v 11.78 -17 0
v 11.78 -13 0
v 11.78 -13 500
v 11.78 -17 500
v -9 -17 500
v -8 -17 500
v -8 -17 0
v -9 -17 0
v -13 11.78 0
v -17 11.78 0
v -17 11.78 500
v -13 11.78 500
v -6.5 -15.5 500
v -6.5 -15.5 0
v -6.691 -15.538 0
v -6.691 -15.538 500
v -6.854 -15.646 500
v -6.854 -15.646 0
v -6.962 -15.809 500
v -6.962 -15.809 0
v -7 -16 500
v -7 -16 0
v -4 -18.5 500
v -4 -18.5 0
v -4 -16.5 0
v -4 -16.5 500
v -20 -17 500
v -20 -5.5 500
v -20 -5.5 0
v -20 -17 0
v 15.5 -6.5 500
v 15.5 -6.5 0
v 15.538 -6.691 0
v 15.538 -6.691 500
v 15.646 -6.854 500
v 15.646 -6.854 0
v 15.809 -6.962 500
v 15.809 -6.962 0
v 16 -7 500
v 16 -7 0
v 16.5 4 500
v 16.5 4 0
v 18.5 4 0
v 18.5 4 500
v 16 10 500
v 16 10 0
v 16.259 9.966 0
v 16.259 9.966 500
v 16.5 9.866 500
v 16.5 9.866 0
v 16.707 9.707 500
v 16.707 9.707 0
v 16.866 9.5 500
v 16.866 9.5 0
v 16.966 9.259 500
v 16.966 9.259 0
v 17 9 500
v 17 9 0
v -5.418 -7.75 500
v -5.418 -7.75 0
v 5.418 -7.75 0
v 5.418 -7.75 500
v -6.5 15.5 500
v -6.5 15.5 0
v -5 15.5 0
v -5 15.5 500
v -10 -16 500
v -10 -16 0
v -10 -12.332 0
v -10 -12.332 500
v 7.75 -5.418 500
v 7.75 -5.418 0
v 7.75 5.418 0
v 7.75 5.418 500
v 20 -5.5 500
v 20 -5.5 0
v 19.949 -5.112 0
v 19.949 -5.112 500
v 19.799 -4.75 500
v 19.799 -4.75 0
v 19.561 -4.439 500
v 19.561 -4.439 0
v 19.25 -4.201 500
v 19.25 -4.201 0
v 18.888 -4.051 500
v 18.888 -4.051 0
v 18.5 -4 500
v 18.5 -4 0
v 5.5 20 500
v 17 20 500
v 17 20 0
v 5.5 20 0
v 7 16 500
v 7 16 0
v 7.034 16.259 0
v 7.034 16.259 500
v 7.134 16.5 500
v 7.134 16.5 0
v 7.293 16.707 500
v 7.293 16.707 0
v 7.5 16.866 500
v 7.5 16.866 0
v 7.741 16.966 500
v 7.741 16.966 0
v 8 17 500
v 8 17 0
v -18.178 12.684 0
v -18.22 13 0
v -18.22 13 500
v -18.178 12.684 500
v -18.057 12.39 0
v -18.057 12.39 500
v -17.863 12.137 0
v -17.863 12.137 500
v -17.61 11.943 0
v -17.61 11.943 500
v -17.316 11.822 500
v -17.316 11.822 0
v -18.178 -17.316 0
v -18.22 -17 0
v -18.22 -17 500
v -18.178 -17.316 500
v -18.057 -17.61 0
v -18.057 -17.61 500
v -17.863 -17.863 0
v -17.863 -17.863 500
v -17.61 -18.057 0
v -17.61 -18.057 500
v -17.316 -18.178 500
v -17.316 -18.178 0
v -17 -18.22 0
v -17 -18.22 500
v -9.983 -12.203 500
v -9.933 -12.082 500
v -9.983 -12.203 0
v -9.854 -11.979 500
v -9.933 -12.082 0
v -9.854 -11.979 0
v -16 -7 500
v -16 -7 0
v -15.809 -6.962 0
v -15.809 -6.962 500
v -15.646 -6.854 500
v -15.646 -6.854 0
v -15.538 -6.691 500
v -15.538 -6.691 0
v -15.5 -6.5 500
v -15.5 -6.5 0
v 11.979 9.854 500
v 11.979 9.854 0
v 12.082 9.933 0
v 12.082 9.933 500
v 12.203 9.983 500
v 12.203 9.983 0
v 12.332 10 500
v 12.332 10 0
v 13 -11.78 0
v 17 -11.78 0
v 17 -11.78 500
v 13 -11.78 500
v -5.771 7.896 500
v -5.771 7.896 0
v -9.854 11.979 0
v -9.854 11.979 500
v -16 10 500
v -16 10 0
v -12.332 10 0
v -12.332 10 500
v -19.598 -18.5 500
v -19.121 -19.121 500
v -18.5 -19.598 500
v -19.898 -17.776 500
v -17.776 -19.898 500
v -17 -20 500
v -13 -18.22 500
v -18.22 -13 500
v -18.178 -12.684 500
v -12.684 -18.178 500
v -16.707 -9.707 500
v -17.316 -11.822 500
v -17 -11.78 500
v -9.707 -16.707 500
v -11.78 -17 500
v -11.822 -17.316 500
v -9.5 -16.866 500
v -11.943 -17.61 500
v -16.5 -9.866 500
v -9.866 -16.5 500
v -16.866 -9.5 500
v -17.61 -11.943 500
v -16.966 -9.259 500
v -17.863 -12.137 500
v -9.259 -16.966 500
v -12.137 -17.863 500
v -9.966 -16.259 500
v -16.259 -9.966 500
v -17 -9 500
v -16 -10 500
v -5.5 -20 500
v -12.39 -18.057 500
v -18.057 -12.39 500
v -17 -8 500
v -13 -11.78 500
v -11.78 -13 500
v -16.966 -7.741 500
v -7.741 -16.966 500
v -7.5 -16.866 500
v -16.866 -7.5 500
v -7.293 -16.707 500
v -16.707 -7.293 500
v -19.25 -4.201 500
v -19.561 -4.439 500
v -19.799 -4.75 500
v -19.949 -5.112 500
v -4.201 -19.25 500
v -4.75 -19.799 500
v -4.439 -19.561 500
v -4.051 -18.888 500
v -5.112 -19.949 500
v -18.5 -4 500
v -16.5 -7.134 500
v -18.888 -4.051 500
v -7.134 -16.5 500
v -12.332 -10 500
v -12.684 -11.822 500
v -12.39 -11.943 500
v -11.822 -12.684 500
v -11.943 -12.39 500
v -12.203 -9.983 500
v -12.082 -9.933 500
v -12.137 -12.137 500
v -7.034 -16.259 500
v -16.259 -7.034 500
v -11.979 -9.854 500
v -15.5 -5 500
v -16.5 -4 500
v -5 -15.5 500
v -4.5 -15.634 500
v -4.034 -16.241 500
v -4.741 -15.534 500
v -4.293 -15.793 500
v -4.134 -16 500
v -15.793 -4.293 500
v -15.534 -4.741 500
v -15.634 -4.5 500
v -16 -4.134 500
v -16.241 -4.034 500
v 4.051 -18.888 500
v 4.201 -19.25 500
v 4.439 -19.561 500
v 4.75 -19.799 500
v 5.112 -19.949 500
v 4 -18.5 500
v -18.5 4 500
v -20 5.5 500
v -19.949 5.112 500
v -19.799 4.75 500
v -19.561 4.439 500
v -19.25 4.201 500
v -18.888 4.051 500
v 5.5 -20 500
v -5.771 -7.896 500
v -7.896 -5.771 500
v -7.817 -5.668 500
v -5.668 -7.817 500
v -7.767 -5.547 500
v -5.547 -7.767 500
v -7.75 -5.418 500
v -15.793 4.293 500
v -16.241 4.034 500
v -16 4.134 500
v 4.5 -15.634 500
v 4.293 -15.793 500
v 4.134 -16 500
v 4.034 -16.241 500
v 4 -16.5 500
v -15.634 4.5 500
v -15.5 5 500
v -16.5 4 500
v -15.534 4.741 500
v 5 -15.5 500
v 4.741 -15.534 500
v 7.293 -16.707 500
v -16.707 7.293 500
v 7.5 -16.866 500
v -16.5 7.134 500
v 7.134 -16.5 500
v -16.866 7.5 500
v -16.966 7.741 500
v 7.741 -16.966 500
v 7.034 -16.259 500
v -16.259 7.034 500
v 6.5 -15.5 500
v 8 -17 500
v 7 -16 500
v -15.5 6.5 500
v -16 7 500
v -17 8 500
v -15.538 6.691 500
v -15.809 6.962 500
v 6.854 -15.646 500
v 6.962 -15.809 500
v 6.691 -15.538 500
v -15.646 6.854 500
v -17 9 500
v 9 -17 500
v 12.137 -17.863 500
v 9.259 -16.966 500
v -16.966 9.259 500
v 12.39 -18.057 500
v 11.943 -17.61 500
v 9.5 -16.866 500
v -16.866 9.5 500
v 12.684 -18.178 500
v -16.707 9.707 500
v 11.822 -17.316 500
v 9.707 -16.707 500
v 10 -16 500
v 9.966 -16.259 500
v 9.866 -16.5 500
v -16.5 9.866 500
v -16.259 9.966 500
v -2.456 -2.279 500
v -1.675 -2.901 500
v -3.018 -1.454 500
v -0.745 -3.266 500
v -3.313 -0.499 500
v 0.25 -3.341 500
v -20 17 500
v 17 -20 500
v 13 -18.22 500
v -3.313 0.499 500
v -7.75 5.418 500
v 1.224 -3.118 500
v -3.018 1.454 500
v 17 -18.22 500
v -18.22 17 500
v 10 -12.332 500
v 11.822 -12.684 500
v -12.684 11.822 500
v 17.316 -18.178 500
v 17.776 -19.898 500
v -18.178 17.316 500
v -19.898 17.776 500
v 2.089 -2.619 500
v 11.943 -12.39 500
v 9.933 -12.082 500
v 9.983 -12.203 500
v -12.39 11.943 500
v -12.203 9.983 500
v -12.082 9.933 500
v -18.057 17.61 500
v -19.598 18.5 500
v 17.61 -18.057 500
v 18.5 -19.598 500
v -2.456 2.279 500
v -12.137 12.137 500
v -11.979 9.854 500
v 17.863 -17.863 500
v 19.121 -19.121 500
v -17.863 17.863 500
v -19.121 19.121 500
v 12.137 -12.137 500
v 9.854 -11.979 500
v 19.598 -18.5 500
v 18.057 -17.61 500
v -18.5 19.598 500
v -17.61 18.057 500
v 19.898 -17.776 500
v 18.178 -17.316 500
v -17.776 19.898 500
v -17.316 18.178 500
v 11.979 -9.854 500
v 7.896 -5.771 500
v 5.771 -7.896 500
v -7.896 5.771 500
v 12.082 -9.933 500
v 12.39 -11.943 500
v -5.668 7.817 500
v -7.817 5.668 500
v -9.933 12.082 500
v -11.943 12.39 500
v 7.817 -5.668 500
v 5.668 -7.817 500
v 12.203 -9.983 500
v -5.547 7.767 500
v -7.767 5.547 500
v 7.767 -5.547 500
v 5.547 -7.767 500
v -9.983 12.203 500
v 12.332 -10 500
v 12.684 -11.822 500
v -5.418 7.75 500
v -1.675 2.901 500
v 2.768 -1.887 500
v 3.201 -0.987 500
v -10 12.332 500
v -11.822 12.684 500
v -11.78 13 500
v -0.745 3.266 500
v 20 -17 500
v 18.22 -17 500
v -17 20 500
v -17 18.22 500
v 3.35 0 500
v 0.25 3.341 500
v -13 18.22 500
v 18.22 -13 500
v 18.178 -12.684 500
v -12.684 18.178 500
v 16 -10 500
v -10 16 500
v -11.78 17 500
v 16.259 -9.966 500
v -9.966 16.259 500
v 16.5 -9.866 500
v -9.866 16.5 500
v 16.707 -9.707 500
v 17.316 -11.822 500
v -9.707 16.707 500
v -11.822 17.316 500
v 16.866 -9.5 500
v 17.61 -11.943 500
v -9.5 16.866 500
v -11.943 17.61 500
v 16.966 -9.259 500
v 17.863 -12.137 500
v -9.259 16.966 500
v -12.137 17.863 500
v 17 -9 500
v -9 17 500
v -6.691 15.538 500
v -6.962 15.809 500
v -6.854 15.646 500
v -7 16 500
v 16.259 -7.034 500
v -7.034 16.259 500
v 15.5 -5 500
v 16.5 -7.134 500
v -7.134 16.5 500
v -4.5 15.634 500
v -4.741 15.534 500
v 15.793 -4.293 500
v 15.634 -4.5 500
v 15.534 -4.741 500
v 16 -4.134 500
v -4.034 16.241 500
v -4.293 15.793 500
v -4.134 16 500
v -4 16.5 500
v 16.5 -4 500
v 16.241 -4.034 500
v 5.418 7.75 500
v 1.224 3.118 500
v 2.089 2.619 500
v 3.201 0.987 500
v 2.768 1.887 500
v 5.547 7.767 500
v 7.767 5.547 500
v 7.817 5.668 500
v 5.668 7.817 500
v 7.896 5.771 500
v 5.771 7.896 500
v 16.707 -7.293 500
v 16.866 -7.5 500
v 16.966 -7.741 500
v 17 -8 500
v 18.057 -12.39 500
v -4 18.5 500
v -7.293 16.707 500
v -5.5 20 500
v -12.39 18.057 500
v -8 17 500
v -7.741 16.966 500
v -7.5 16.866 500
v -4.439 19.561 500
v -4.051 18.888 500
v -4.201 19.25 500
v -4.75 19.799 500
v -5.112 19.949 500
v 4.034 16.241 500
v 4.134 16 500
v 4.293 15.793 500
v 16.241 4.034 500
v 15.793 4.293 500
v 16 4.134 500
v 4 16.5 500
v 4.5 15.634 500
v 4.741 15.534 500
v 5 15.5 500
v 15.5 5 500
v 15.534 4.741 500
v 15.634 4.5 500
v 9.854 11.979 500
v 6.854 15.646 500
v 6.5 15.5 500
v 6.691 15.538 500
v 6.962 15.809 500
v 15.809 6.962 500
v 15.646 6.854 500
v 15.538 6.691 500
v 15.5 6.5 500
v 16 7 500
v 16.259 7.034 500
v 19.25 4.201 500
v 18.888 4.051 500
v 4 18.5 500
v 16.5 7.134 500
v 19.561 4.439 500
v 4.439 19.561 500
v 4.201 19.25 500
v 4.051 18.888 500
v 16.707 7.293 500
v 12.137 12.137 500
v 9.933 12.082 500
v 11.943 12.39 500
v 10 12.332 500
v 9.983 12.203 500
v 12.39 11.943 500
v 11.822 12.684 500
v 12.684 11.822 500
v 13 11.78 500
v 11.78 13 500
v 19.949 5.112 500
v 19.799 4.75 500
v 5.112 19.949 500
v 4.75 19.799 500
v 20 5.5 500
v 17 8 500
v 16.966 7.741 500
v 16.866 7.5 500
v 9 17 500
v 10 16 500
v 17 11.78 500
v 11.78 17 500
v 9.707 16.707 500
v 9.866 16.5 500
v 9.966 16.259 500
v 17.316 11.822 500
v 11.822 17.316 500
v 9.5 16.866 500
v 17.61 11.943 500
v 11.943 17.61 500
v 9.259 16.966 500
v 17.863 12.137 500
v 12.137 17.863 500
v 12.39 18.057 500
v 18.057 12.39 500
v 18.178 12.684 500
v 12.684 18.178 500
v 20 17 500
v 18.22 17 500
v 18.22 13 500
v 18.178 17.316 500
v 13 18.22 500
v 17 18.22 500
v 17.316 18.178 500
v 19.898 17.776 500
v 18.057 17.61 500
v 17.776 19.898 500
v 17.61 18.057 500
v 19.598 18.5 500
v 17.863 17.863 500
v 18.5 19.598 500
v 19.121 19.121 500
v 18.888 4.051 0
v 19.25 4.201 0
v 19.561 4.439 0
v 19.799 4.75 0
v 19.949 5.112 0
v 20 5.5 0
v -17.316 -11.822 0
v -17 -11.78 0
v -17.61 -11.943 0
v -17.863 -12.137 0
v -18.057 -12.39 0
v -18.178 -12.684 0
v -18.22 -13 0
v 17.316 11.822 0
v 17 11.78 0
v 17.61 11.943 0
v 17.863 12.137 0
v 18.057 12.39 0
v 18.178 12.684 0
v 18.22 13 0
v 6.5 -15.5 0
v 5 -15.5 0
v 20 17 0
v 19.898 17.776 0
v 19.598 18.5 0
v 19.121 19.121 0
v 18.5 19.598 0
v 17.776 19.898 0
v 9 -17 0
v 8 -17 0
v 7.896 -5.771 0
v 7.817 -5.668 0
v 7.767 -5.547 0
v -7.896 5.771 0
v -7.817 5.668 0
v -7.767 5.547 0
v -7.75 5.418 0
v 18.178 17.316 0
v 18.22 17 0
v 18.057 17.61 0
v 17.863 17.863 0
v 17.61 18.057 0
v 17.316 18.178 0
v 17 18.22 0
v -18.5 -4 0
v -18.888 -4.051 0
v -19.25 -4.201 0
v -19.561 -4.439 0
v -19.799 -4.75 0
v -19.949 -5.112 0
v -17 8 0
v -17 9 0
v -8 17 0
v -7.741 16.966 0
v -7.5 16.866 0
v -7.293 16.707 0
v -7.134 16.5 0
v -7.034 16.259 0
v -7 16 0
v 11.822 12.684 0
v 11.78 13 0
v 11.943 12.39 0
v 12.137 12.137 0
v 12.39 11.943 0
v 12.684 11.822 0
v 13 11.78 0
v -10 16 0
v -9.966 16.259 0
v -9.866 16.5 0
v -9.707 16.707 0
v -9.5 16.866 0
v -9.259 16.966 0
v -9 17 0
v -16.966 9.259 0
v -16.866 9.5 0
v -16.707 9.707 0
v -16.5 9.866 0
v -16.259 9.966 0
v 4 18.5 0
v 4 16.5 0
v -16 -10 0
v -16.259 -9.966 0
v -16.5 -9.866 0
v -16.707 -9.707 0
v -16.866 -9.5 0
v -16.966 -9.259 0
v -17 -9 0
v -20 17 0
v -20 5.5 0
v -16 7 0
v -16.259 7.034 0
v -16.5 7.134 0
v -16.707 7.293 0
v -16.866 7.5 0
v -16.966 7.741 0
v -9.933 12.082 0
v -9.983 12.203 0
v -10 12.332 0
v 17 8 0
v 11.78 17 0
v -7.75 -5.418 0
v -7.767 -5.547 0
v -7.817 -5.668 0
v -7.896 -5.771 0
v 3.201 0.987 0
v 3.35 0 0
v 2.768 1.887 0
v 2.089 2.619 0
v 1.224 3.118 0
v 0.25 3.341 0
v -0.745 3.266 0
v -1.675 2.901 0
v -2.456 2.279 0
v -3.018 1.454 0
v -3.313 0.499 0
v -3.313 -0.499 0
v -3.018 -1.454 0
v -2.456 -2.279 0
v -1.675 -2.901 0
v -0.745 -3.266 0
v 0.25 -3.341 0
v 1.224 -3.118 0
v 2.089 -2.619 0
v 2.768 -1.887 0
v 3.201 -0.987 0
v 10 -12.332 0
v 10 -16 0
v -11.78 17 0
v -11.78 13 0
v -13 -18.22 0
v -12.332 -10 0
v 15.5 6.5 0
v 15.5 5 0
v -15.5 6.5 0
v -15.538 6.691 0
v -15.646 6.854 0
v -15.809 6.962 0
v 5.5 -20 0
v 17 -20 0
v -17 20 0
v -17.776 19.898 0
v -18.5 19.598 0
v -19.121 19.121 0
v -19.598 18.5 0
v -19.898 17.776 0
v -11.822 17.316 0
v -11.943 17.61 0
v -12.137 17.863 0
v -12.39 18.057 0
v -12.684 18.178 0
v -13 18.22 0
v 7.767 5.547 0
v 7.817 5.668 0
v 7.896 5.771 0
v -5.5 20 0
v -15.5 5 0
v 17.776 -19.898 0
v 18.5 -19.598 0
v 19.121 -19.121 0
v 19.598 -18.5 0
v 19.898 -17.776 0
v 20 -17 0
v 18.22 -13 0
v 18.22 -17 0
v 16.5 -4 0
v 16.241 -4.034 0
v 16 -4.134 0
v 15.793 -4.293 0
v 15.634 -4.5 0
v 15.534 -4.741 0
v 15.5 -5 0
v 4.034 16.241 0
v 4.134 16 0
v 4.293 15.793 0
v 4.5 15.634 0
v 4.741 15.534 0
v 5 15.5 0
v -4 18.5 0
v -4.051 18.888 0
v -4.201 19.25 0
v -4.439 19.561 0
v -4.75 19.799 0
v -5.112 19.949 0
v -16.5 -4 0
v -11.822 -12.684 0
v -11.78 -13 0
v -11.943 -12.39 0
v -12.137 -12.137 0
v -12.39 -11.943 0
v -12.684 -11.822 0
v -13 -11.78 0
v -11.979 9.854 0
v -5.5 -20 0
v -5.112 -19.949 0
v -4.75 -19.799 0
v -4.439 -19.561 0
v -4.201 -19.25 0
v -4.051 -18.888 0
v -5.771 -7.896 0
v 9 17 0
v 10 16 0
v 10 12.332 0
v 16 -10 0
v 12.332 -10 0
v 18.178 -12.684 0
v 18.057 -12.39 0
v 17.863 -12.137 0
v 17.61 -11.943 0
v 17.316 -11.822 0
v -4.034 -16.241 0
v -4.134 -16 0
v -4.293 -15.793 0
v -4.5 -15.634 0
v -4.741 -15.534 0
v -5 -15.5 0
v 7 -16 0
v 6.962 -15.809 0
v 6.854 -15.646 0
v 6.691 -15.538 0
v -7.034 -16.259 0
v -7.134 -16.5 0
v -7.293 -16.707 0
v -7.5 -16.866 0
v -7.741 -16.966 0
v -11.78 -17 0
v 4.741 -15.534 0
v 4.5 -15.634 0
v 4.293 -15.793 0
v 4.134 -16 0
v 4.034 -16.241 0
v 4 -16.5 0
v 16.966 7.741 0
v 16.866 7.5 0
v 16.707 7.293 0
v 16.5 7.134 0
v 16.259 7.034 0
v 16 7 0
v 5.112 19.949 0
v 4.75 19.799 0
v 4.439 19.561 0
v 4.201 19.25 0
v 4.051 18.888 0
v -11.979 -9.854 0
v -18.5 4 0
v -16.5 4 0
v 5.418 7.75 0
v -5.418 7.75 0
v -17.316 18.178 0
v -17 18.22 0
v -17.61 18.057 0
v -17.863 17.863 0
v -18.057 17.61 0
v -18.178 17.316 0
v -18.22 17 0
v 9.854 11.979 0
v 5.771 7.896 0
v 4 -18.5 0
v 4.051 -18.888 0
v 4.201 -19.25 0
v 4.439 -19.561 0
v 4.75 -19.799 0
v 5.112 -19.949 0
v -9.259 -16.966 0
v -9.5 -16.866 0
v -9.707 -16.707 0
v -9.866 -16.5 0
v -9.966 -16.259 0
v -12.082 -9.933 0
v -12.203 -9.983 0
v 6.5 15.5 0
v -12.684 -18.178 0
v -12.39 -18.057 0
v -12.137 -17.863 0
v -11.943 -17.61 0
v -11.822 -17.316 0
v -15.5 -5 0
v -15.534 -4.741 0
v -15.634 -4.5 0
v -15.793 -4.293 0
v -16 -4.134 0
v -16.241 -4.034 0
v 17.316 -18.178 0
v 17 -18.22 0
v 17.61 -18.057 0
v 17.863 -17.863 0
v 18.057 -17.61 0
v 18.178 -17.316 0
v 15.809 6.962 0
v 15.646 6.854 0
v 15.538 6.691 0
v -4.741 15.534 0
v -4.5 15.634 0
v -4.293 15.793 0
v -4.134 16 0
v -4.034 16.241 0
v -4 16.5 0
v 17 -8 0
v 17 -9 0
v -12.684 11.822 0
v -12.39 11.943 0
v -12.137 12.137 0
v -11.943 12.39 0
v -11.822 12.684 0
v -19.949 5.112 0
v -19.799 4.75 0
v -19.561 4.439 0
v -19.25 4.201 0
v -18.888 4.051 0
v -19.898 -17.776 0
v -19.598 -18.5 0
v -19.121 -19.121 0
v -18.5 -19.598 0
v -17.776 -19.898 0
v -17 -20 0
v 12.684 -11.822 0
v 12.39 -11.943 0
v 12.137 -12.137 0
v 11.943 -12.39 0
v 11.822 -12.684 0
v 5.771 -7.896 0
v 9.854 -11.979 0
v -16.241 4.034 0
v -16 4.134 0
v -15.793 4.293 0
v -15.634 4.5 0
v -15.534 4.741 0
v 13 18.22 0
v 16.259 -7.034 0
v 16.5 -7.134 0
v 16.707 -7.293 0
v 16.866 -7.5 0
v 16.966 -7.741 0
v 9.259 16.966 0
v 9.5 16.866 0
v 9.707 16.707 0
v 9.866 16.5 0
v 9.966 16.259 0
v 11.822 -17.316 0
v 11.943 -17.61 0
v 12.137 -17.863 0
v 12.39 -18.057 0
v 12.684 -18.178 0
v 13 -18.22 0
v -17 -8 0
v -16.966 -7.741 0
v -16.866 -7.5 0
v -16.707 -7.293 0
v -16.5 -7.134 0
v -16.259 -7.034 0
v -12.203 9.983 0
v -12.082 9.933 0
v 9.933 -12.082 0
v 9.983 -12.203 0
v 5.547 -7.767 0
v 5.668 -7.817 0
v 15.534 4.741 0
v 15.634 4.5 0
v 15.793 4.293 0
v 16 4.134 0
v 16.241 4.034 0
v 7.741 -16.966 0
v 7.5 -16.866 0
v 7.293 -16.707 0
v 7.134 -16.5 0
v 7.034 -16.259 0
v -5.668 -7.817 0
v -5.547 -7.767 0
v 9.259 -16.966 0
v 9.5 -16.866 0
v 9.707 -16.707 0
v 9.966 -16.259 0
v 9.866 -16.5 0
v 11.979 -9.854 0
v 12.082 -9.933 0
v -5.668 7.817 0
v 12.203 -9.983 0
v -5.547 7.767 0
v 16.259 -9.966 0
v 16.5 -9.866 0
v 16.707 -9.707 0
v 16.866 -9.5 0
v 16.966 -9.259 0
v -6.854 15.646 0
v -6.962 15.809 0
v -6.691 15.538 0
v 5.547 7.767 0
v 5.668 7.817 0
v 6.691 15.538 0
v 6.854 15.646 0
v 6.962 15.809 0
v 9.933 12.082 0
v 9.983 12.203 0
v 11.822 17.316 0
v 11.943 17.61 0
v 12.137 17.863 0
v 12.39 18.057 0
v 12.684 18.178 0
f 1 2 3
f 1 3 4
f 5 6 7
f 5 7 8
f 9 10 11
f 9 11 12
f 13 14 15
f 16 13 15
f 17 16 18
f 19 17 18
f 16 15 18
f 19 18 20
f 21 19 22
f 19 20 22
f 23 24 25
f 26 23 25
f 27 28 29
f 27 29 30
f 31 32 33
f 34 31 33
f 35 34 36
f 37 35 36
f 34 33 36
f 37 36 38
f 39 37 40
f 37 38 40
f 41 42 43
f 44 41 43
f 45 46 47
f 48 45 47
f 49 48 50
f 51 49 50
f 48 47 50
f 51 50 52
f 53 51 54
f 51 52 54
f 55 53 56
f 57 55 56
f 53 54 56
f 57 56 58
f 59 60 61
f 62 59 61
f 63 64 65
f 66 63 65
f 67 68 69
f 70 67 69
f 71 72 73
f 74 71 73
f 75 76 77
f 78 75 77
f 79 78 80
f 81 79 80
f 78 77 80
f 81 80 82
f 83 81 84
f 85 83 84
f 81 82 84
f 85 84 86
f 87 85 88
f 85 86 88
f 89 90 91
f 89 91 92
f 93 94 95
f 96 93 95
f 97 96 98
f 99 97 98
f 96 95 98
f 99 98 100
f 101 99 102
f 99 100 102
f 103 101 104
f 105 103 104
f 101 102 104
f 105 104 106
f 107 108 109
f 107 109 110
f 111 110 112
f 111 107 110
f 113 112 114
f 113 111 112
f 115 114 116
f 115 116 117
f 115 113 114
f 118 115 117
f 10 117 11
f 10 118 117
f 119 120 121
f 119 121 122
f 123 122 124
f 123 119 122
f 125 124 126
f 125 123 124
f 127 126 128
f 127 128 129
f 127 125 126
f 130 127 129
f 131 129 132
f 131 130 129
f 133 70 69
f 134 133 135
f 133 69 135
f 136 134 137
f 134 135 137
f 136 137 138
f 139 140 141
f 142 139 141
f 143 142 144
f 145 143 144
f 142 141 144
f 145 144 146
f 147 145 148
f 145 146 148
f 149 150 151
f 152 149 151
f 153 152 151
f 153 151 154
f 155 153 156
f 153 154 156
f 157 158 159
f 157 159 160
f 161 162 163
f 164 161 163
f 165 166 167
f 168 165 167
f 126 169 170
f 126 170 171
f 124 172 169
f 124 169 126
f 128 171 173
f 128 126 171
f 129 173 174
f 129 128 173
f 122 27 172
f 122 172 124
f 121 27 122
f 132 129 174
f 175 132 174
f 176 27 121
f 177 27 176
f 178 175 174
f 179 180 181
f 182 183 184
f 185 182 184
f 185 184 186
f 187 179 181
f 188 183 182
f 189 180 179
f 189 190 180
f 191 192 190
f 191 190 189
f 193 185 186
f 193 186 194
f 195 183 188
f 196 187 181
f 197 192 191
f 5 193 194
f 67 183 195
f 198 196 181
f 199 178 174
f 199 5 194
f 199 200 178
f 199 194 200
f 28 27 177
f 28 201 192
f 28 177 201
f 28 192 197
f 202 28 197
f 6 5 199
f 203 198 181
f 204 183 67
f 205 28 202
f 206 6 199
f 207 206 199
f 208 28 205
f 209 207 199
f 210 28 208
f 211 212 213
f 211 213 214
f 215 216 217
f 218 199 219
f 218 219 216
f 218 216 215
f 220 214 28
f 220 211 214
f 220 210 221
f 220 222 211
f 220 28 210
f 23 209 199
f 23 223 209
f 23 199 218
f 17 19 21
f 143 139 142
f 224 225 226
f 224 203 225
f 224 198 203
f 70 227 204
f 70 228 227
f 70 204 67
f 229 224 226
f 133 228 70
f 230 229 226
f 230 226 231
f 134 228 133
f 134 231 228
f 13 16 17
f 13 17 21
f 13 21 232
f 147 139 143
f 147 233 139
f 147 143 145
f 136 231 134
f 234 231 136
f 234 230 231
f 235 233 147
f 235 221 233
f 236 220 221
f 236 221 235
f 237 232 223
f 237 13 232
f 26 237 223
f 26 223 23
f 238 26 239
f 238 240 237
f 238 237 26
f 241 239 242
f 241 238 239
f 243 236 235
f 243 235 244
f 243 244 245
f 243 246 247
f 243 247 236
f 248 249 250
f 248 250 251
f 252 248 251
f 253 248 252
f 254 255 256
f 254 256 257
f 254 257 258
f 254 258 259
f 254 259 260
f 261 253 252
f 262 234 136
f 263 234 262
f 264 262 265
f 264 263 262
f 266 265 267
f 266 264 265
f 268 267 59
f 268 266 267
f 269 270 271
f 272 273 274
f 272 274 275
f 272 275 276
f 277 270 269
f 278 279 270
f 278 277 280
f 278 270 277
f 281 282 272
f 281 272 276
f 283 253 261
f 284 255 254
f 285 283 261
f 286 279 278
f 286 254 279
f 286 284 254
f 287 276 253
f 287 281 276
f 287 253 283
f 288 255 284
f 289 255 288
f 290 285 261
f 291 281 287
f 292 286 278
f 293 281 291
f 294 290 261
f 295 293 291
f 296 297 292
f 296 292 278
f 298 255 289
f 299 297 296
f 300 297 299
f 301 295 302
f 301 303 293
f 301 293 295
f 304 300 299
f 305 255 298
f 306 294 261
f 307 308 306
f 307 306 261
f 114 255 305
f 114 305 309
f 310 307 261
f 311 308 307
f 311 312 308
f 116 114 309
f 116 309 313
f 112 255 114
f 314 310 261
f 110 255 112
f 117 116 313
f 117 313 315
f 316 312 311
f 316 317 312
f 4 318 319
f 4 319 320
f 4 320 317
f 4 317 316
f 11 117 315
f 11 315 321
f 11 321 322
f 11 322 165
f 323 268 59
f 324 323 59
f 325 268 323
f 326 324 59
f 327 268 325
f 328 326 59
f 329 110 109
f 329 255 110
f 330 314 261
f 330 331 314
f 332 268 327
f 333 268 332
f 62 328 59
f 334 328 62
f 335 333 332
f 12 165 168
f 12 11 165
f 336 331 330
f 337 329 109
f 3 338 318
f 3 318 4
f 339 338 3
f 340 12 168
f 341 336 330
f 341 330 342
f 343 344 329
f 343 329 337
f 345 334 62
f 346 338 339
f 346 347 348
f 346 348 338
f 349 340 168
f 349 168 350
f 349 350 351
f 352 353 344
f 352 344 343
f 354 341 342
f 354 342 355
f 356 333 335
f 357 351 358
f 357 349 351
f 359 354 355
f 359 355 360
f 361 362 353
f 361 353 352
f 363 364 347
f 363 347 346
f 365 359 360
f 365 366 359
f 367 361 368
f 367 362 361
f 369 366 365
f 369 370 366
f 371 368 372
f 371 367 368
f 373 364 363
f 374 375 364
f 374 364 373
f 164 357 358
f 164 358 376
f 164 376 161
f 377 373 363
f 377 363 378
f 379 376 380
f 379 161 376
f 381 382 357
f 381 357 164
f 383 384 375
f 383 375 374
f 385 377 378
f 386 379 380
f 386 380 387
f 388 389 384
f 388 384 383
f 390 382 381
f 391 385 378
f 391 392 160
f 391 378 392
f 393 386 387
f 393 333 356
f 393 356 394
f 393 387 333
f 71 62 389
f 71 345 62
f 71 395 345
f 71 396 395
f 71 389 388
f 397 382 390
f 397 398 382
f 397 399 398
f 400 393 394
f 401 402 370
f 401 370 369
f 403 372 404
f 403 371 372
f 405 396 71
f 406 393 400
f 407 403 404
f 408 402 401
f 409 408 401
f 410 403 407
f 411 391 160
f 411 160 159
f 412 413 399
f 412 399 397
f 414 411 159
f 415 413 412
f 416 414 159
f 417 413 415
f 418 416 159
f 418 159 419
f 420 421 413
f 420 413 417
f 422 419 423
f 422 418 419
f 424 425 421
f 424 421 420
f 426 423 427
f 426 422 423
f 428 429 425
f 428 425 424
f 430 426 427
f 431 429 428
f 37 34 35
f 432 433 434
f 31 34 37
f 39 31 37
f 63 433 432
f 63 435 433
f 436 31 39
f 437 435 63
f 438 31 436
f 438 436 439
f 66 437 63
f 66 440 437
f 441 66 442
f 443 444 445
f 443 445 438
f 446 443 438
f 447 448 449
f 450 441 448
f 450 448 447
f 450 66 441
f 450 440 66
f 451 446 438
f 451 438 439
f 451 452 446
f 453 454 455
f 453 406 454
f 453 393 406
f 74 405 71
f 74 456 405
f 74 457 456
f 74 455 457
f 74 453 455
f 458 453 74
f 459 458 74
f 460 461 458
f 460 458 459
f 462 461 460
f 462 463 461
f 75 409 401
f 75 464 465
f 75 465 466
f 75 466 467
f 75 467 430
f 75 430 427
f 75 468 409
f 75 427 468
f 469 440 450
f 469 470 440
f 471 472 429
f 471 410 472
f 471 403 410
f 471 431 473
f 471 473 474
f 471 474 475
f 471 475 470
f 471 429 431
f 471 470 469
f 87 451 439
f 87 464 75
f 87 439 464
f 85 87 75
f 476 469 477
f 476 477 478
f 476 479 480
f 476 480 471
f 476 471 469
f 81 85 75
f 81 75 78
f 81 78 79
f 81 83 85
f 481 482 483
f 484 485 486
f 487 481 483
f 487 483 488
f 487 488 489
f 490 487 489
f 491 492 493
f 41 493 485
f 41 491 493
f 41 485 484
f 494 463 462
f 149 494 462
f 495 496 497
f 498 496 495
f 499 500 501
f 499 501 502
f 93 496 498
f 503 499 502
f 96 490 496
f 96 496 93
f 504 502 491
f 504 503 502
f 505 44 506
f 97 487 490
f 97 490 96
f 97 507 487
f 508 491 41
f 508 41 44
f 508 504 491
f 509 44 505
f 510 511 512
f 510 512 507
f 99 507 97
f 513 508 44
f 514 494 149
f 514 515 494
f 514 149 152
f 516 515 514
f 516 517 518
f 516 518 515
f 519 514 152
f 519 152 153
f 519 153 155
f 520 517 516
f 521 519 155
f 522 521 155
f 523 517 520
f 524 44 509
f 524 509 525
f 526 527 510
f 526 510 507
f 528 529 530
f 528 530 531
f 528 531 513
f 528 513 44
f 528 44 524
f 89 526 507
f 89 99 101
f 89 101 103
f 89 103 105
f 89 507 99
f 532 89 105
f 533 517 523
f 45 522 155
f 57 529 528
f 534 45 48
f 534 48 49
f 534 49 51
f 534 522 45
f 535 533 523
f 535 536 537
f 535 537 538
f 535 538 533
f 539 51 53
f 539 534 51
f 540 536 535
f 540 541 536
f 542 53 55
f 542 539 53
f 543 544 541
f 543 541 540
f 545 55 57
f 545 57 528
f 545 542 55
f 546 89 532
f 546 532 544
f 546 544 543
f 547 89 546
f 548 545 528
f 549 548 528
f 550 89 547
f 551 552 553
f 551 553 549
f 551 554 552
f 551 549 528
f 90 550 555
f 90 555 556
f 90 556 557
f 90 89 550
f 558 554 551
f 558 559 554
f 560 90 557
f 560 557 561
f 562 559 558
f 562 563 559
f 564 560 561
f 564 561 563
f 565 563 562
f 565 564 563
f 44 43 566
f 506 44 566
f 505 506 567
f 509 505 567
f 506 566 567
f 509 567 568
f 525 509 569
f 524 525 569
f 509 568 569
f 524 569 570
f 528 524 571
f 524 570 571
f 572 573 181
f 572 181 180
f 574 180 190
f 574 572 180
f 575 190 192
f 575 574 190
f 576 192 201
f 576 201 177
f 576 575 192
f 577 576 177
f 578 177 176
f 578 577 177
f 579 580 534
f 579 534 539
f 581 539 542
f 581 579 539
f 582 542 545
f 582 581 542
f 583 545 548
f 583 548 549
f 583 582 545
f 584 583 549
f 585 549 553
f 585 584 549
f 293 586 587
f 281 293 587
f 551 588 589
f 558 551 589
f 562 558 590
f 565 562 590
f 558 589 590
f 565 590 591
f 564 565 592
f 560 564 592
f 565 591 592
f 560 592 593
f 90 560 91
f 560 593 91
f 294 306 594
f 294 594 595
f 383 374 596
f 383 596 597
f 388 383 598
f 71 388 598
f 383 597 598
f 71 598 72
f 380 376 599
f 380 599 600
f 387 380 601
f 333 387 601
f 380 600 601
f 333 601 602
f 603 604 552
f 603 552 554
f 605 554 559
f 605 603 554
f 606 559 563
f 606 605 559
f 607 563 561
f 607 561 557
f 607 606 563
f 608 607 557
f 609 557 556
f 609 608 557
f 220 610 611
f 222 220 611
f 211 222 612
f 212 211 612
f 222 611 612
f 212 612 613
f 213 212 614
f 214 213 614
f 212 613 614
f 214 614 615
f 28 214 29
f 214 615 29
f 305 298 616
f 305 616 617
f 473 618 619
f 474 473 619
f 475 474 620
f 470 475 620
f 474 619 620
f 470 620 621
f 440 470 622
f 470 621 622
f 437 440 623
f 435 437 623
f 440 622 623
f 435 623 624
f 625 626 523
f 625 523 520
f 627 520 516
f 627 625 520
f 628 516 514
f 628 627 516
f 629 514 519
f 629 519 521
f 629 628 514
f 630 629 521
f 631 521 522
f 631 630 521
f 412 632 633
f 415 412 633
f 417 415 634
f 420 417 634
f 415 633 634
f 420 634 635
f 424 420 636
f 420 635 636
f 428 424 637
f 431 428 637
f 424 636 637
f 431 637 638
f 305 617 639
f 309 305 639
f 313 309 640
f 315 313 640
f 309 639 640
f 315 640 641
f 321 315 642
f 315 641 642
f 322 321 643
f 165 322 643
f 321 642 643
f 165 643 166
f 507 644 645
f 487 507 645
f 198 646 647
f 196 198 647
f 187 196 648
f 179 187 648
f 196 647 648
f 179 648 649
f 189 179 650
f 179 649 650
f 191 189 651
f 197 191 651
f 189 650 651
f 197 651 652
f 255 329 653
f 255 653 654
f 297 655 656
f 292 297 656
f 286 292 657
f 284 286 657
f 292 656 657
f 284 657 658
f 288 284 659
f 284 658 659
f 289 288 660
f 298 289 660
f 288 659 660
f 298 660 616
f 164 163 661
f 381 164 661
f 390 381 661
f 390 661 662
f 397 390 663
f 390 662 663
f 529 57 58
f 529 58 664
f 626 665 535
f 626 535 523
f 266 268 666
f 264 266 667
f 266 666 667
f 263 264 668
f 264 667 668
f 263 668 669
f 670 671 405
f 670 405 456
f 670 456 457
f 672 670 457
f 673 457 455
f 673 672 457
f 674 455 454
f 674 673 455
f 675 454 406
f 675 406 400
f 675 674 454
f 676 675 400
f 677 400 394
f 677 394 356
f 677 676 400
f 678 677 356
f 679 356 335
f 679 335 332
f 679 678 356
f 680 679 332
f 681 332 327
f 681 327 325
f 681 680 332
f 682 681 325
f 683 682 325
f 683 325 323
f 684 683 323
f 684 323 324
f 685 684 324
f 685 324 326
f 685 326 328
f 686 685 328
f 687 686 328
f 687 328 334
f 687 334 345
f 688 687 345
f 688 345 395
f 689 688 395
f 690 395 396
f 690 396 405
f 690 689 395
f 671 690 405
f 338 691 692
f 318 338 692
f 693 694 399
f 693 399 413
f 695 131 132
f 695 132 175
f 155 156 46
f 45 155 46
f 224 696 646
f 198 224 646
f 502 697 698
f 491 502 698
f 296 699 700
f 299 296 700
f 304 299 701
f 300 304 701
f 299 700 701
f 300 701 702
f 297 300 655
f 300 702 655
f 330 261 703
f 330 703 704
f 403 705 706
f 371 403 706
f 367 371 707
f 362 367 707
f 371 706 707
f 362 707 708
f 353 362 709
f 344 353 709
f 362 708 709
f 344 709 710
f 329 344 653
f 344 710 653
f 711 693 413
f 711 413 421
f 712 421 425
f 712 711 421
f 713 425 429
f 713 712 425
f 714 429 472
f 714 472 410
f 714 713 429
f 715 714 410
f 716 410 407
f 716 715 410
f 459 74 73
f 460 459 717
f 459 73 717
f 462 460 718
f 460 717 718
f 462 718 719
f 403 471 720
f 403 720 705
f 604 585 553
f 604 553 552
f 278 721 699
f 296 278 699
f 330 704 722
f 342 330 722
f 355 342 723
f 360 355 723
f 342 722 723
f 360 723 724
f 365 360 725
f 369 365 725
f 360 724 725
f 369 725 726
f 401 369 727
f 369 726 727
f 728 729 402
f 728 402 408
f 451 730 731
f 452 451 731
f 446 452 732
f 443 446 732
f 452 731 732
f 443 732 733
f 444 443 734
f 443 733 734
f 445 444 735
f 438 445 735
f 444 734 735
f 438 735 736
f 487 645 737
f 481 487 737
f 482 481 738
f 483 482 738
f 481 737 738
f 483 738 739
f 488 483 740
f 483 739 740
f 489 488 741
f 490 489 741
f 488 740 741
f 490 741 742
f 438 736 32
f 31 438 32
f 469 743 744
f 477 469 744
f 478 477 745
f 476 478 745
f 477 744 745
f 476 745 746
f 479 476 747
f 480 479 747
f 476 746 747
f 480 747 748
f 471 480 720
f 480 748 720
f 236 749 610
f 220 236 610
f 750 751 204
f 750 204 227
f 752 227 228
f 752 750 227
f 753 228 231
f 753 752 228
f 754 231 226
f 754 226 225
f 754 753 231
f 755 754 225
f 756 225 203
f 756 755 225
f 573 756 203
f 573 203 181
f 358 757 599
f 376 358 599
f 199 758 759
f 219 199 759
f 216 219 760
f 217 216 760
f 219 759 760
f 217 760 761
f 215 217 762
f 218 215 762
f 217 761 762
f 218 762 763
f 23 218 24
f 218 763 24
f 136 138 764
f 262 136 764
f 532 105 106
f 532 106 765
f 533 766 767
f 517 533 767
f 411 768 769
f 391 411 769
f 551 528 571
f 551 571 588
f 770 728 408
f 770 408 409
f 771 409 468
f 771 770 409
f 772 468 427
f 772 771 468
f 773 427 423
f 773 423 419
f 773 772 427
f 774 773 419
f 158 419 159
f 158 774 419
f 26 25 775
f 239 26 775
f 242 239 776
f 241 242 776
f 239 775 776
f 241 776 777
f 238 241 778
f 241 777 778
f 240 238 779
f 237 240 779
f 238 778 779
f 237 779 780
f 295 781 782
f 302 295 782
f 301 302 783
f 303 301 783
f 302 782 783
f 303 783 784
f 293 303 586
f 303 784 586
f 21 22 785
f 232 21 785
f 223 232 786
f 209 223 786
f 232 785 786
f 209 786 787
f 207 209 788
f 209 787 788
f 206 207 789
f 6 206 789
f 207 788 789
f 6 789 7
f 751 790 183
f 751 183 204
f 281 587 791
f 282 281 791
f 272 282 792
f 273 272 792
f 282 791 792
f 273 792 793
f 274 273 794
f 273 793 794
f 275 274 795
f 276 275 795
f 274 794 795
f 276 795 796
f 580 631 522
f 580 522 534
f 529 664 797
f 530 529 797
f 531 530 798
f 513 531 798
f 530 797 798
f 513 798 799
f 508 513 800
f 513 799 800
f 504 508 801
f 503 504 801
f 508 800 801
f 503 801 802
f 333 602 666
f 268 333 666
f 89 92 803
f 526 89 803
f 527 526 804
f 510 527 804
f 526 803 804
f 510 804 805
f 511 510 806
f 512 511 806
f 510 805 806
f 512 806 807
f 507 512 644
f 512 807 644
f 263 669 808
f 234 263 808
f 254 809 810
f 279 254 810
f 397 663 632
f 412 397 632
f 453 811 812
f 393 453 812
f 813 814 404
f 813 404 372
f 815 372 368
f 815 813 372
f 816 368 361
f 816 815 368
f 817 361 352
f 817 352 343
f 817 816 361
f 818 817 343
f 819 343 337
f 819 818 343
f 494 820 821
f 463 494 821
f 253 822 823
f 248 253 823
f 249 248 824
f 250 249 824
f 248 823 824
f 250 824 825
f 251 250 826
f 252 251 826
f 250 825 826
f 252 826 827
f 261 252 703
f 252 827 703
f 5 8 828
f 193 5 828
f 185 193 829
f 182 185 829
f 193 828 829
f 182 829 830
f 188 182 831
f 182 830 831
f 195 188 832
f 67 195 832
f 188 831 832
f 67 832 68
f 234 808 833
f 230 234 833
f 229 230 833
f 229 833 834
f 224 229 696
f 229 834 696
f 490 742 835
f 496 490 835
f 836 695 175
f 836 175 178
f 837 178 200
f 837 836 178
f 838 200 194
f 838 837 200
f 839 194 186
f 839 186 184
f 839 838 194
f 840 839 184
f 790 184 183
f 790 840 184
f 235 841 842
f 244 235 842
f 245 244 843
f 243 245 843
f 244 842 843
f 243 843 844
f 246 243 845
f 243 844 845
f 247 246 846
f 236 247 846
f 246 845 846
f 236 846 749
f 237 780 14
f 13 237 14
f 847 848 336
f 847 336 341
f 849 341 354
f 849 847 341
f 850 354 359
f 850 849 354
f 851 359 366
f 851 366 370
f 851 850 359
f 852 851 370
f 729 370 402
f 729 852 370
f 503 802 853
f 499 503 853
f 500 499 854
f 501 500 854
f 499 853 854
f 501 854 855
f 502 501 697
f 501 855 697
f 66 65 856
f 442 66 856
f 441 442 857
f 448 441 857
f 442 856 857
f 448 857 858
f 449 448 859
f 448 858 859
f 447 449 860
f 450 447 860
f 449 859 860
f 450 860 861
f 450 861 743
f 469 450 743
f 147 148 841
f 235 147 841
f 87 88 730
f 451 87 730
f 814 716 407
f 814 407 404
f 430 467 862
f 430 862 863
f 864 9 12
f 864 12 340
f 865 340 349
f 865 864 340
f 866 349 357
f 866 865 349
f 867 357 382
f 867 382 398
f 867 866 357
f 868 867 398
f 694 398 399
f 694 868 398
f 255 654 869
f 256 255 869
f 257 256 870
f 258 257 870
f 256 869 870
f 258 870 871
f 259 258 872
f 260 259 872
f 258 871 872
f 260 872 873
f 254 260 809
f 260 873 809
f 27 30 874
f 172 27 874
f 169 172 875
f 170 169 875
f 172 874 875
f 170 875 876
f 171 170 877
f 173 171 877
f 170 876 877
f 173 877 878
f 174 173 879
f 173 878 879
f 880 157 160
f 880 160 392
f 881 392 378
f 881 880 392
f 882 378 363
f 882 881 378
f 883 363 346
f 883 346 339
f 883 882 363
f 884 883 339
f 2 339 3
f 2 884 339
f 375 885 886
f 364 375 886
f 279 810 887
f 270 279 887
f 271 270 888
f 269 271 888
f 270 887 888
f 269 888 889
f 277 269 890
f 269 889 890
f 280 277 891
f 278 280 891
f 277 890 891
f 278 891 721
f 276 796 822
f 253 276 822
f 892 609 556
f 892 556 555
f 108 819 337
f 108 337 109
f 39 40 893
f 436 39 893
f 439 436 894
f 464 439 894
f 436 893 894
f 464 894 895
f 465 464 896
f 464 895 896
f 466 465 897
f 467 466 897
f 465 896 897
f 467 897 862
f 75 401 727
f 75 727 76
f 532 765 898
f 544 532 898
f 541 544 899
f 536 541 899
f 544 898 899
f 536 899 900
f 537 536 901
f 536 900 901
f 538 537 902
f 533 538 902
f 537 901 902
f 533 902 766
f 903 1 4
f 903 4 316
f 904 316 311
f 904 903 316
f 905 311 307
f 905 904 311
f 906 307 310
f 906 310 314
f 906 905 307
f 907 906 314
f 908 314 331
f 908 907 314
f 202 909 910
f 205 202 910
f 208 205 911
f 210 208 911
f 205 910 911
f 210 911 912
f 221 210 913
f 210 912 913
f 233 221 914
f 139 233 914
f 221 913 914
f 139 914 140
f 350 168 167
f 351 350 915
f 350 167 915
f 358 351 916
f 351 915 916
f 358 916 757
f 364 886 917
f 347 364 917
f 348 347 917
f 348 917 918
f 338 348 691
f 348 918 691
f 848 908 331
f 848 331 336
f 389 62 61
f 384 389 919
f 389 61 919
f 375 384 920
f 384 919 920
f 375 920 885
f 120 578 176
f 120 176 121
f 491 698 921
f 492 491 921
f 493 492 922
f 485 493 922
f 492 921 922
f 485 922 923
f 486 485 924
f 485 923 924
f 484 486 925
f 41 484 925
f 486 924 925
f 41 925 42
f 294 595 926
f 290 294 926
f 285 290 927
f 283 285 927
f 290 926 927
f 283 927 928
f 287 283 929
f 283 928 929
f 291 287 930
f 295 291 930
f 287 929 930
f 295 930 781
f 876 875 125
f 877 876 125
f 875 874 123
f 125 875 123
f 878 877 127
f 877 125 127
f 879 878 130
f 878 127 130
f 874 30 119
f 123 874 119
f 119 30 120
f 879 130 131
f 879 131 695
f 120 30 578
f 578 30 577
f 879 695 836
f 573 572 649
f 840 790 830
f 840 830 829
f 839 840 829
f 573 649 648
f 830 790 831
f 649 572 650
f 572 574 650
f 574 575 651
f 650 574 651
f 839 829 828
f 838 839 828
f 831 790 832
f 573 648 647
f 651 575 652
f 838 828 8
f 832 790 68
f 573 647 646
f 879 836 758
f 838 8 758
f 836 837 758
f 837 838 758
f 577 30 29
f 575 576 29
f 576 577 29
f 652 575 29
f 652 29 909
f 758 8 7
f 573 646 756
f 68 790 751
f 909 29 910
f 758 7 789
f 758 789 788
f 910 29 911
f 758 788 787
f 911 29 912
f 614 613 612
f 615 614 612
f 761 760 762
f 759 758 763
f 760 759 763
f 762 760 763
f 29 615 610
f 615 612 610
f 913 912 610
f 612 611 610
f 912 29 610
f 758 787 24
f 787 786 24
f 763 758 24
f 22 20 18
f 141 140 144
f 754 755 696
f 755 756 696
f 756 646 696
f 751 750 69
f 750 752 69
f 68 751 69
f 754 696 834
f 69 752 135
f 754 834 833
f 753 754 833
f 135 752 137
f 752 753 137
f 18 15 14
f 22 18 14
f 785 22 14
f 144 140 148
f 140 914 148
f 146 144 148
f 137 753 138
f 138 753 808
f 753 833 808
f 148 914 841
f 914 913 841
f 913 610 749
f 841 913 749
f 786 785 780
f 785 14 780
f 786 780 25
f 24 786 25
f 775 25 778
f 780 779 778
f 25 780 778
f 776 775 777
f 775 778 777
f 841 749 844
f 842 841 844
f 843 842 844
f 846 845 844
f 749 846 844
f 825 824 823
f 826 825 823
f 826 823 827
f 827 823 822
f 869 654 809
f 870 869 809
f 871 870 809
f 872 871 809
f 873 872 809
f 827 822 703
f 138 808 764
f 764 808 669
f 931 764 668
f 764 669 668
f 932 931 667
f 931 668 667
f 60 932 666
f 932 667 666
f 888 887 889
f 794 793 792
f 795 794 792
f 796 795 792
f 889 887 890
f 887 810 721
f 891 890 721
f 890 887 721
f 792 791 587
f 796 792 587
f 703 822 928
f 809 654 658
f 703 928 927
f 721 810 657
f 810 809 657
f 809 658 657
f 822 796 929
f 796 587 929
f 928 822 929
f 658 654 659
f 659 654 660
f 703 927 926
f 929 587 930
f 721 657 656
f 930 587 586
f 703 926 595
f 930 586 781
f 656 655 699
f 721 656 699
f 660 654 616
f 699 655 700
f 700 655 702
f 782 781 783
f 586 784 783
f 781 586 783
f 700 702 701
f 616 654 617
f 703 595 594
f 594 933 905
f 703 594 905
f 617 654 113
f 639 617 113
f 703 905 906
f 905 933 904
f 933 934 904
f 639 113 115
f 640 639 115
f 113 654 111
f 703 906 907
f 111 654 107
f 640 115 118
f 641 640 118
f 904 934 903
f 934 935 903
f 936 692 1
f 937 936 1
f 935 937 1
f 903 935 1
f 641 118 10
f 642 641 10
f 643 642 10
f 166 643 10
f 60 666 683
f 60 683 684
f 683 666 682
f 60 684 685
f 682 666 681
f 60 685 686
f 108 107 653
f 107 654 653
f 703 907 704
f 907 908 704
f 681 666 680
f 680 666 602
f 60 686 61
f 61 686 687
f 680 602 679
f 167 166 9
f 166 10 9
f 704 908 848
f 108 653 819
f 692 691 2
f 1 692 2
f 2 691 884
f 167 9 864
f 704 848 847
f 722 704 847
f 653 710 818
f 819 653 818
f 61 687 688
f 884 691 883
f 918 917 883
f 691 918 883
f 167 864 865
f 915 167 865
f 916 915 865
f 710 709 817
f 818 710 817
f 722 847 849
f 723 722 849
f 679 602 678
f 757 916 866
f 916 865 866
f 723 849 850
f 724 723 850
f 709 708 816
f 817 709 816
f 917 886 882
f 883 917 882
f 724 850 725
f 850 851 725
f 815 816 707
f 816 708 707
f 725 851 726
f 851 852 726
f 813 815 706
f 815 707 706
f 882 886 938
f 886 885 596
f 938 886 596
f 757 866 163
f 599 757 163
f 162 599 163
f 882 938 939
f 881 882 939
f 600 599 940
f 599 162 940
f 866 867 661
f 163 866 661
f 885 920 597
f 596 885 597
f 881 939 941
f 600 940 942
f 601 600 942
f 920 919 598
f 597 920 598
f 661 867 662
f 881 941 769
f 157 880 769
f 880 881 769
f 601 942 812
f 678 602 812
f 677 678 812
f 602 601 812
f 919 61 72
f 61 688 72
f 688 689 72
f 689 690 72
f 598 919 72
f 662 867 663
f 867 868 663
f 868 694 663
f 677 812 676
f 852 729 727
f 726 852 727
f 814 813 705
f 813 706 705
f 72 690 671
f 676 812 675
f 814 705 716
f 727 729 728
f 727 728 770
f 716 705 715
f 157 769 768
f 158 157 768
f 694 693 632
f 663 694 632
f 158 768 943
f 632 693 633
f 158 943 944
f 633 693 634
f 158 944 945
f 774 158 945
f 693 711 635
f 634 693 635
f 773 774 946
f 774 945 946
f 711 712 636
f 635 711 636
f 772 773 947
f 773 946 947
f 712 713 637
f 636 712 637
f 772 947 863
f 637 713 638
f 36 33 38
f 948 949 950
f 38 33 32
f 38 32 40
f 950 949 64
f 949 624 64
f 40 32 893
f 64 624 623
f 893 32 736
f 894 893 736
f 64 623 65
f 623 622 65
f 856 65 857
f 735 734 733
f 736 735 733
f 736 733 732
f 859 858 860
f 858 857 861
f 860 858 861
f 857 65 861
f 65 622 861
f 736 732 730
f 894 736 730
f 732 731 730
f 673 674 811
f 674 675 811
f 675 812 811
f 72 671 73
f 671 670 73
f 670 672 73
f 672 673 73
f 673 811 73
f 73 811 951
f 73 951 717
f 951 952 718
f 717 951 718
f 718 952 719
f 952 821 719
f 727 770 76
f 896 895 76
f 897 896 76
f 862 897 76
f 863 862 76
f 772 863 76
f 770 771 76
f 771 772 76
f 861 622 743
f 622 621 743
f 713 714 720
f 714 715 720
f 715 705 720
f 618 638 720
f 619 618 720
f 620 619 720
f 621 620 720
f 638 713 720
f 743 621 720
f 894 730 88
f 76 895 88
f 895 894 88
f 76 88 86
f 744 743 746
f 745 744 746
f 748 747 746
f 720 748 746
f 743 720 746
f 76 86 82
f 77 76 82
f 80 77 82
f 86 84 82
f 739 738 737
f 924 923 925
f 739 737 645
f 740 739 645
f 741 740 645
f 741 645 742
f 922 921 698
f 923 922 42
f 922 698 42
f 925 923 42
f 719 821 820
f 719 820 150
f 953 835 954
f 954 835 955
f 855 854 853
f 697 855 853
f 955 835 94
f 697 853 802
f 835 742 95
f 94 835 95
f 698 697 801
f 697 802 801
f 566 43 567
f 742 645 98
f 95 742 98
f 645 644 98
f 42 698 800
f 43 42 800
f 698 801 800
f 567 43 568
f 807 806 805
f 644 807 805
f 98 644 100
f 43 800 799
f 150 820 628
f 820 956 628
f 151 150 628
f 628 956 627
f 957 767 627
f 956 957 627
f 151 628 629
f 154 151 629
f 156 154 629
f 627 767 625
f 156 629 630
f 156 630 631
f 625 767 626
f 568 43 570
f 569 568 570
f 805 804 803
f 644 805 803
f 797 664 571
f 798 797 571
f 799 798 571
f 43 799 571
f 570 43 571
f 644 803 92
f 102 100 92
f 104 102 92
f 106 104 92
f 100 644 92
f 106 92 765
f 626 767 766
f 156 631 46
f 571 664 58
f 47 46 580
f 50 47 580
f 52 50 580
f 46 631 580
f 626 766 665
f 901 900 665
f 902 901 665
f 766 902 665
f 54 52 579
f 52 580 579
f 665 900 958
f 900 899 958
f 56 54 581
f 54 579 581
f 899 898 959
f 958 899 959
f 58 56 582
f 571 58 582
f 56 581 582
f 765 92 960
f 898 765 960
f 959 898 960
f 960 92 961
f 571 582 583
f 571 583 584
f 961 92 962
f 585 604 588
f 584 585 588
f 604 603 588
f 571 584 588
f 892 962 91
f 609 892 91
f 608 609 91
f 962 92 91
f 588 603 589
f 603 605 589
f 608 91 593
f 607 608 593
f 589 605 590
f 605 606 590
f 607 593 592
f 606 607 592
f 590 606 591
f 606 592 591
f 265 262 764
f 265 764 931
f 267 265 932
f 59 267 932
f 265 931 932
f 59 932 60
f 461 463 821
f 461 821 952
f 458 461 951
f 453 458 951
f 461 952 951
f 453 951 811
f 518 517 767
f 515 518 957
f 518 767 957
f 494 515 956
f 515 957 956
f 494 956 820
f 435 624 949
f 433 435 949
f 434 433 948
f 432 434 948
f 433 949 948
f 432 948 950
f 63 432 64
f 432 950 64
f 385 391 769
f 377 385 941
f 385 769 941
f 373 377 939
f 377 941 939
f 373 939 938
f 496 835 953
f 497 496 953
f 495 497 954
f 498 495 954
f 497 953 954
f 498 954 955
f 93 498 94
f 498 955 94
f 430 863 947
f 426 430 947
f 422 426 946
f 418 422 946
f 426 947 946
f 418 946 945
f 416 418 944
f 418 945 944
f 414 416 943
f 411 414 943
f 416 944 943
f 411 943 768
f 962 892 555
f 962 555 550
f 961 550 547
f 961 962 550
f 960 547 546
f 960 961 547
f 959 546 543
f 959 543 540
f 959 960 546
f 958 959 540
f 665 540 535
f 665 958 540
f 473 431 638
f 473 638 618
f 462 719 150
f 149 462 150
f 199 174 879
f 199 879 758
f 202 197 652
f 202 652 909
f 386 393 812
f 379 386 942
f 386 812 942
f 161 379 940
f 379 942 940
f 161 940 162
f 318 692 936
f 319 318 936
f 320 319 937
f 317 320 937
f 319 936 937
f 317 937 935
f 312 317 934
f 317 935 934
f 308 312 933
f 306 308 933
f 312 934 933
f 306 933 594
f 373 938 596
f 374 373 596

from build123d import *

# Parameters (mm, degrees)
SKETCH1_R           = 3.35
BOSS_EXTRUDE1_DEPTH = 500


with BuildPart() as part:
    # Sketch1 → Boss-Extrude1 (new body)
    with BuildSketch(Plane.XY):
        with BuildLine():
            Line((-9.853553391, -11.978553391), (-5.771446609, -7.896446609))
            ThreePointArc((-5.771446609, -7.896446609), (-5.609234935, -7.788060234), (-5.417893219, -7.75))
            Line((-5.417893219, -7.75), (5.417893219, -7.75))
            ThreePointArc((5.417893219, -7.75), (5.609234935, -7.788060234), (5.771446609, -7.896446609))
            Line((5.771446609, -7.896446609), (9.853553391, -11.978553391))
            ThreePointArc((9.853553391, -11.978553391), (9.961939766, -12.140765065), (10, -12.332106781))
            Line((10, -12.332106781), (10, -16))
            ThreePointArc((10, -16), (9.707106781, -16.707106781), (9, -17))
            Line((9, -17), (8, -17))
            ThreePointArc((8, -17), (7.292893219, -16.707106781), (7, -16))
            ThreePointArc((7, -16), (6.853553391, -15.646446609), (6.5, -15.5))
            Line((6.5, -15.5), (5, -15.5))
            ThreePointArc((5, -15.5), (4.292893219, -15.792893219), (4, -16.5))
            Line((4, -16.5), (4, -18.5))
            ThreePointArc((4, -18.5), (4.439339828, -19.560660172), (5.5, -20))
            Line((5.5, -20), (17, -20))
            ThreePointArc((17, -20), (19.121320344, -19.121320344), (20, -17))
            Line((20, -17), (20, -5.5))
            ThreePointArc((20, -5.5), (19.560660172, -4.439339828), (18.5, -4))
            Line((18.5, -4), (16.5, -4))
            ThreePointArc((16.5, -4), (15.792893219, -4.292893219), (15.5, -5))
            Line((15.5, -5), (15.5, -6.5))
            ThreePointArc((15.5, -6.5), (15.646446609, -6.853553391), (16, -7))
            ThreePointArc((16, -7), (16.707106781, -7.292893219), (17, -8))
            Line((17, -8), (17, -9))
            ThreePointArc((17, -9), (16.707106781, -9.707106781), (16, -10))
            Line((16, -10), (12.332106781, -10))
            ThreePointArc((12.332106781, -10), (12.140765065, -9.961939766), (11.978553391, -9.853553391))
            Line((11.978553391, -9.853553391), (7.896446609, -5.771446609))
            ThreePointArc((7.896446609, -5.771446609), (7.788060234, -5.609234935), (7.75, -5.417893219))
            Line((7.75, -5.417893219), (7.75, 5.417893219))
            ThreePointArc((7.75, 5.417893219), (7.788060234, 5.609234935), (7.896446609, 5.771446609))
            Line((7.896446609, 5.771446609), (11.978553391, 9.853553391))
            ThreePointArc((11.978553391, 9.853553391), (12.140765065, 9.961939766), (12.332106781, 10))
            Line((12.332106781, 10), (16, 10))
            ThreePointArc((16, 10), (16.707106781, 9.707106781), (17, 9))
            Line((17, 9), (17, 8))
            ThreePointArc((17, 8), (16.707106781, 7.292893219), (16, 7))
            ThreePointArc((16, 7), (15.646446609, 6.853553391), (15.5, 6.5))
            Line((15.5, 6.5), (15.5, 5))
            ThreePointArc((15.5, 5), (15.792893219, 4.292893219), (16.5, 4))
            Line((16.5, 4), (18.5, 4))
            ThreePointArc((18.5, 4), (19.560660172, 4.439339828), (20, 5.5))
            Line((20, 5.5), (20, 17))
            ThreePointArc((20, 17), (19.121320344, 19.121320344), (17, 20))
            Line((17, 20), (5.5, 20))
            ThreePointArc((5.5, 20), (4.439339828, 19.560660172), (4, 18.5))
            Line((4, 18.5), (4, 16.5))
            ThreePointArc((4, 16.5), (4.292893219, 15.792893219), (5, 15.5))
            Line((5, 15.5), (6.5, 15.5))
            ThreePointArc((6.5, 15.5), (6.853553391, 15.646446609), (7, 16))
            ThreePointArc((7, 16), (7.292893219, 16.707106781), (8, 17))
            Line((8, 17), (9, 17))
            ThreePointArc((9, 17), (9.707106781, 16.707106781), (10, 16))
            Line((10, 16), (10, 12.332106781))
            ThreePointArc((10, 12.332106781), (9.961939766, 12.140765065), (9.853553391, 11.978553391))
            Line((9.853553391, 11.978553391), (5.771446609, 7.896446609))
            ThreePointArc((5.771446609, 7.896446609), (5.609234935, 7.788060234), (5.417893219, 7.75))
            Line((5.417893219, 7.75), (-5.417893219, 7.75))
            ThreePointArc((-5.417893219, 7.75), (-5.609234935, 7.788060234), (-5.771446609, 7.896446609))
            Line((-5.771446609, 7.896446609), (-9.853553391, 11.978553391))
            ThreePointArc((-9.853553391, 11.978553391), (-9.961939766, 12.140765065), (-10, 12.332106781))
            Line((-10, 12.332106781), (-10, 16))
            ThreePointArc((-10, 16), (-9.707106781, 16.707106781), (-9, 17))
            Line((-9, 17), (-8, 17))
            ThreePointArc((-8, 17), (-7.292893219, 16.707106781), (-7, 16))
            ThreePointArc((-7, 16), (-6.853553391, 15.646446609), (-6.5, 15.5))
            Line((-6.5, 15.5), (-5, 15.5))
            ThreePointArc((-5, 15.5), (-4.292893219, 15.792893219), (-4, 16.5))
            Line((-4, 16.5), (-4, 18.5))
            ThreePointArc((-4, 18.5), (-4.439339828, 19.560660172), (-5.5, 20))
            Line((-5.5, 20), (-17, 20))
            ThreePointArc((-17, 20), (-19.121320344, 19.121320344), (-20, 17))
            Line((-20, 17), (-20, 5.5))
            ThreePointArc((-20, 5.5), (-19.560660172, 4.439339828), (-18.5, 4))
            Line((-18.5, 4), (-16.5, 4))
            ThreePointArc((-16.5, 4), (-15.792893219, 4.292893219), (-15.5, 5))
            Line((-15.5, 5), (-15.5, 6.5))
            ThreePointArc((-15.5, 6.5), (-15.646446609, 6.853553391), (-16, 7))
            ThreePointArc((-16, 7), (-16.707106781, 7.292893219), (-17, 8))
            Line((-17, 8), (-17, 9))
            ThreePointArc((-17, 9), (-16.707106781, 9.707106781), (-16, 10))
            Line((-16, 10), (-12.332106781, 10))
            ThreePointArc((-12.332106781, 10), (-12.140765065, 9.961939766), (-11.978553391, 9.853553391))
            Line((-11.978553391, 9.853553391), (-7.896446609, 5.771446609))
            ThreePointArc((-7.896446609, 5.771446609), (-7.788060234, 5.609234935), (-7.75, 5.417893219))
            Line((-7.75, 5.417893219), (-7.75, -5.417893219))
            ThreePointArc((-7.75, -5.417893219), (-7.788060234, -5.609234935), (-7.896446609, -5.771446609))
            Line((-7.896446609, -5.771446609), (-11.978553391, -9.853553391))
            ThreePointArc((-11.978553391, -9.853553391), (-12.140765065, -9.961939766), (-12.332106781, -10))
            Line((-12.332106781, -10), (-16, -10))
            ThreePointArc((-16, -10), (-16.707106781, -9.707106781), (-17, -9))
            Line((-17, -9), (-17, -8))
            ThreePointArc((-17, -8), (-16.707106781, -7.292893219), (-16, -7))
            ThreePointArc((-16, -7), (-15.646446609, -6.853553391), (-15.5, -6.5))
            Line((-15.5, -6.5), (-15.5, -5))
            ThreePointArc((-15.5, -5), (-15.792893219, -4.292893219), (-16.5, -4))
            Line((-16.5, -4), (-18.5, -4))
            ThreePointArc((-18.5, -4), (-19.560660172, -4.439339828), (-20, -5.5))
            Line((-20, -5.5), (-20, -17))
            ThreePointArc((-20, -17), (-19.121320344, -19.121320344), (-17, -20))
            Line((-17, -20), (-5.5, -20))
            ThreePointArc((-5.5, -20), (-4.439339828, -19.560660172), (-4, -18.5))
            Line((-4, -18.5), (-4, -16.5))
            ThreePointArc((-4, -16.5), (-4.292893219, -15.792893219), (-5, -15.5))
            Line((-5, -15.5), (-6.5, -15.5))
            ThreePointArc((-6.5, -15.5), (-6.853553391, -15.646446609), (-7, -16))
            ThreePointArc((-7, -16), (-7.292893219, -16.707106781), (-8, -17))
            Line((-8, -17), (-9, -17))
            ThreePointArc((-9, -17), (-9.707106781, -16.707106781), (-10, -16))
            Line((-10, -16), (-10, -12.332106781))
            ThreePointArc((-10, -12.332106781), (-9.961939766, -12.140765065), (-9.853553391, -11.978553391))
        make_face()
        Circle(SKETCH1_R, mode=Mode.SUBTRACT)
        with BuildLine():
            Line((-17, 11.78), (-13, 11.78))
            ThreePointArc((-13, 11.78), (-12.137329727, 12.137329727), (-11.78, 13))
            Line((-11.78, 13), (-11.78, 17))
            ThreePointArc((-11.78, 17), (-12.137329727, 17.862670273), (-13, 18.22))
            Line((-13, 18.22), (-17, 18.22))
            ThreePointArc((-17, 18.22), (-17.862670273, 17.862670273), (-18.22, 17))
            Line((-18.22, 17), (-18.22, 13))
            ThreePointArc((-18.22, 13), (-17.862670273, 12.137329727), (-17, 11.78))
        make_face(mode=Mode.SUBTRACT)
        with BuildLine():
            Line((-18.22, -13), (-18.22, -17))
            ThreePointArc((-18.22, -17), (-17.862670273, -17.862670273), (-17, -18.22))
            Line((-17, -18.22), (-13, -18.22))
            ThreePointArc((-13, -18.22), (-12.137329727, -17.862670273), (-11.78, -17))
            Line((-11.78, -17), (-11.78, -13))
            ThreePointArc((-11.78, -13), (-12.137329727, -12.137329727), (-13, -11.78))
            Line((-13, -11.78), (-17, -11.78))
            ThreePointArc((-17, -11.78), (-17.862670273, -12.137329727), (-18.22, -13))
        make_face(mode=Mode.SUBTRACT)
        with BuildLine():
            Line((13, -18.22), (17, -18.22))
            ThreePointArc((17, -18.22), (17.862670273, -17.862670273), (18.22, -17))
            Line((18.22, -17), (18.22, -13))
            ThreePointArc((18.22, -13), (17.862670273, -12.137329727), (17, -11.78))
            Line((17, -11.78), (13, -11.78))
            ThreePointArc((13, -11.78), (12.137329727, -12.137329727), (11.78, -13))
            Line((11.78, -13), (11.78, -17))
            ThreePointArc((11.78, -17), (12.137329727, -17.862670273), (13, -18.22))
        make_face(mode=Mode.SUBTRACT)
        with BuildLine():
            Line((18.22, 13), (18.22, 17))
            ThreePointArc((18.22, 17), (17.862670273, 17.862670273), (17, 18.22))
            Line((17, 18.22), (13, 18.22))
            ThreePointArc((13, 18.22), (12.137329727, 17.862670273), (11.78, 17))
            Line((11.78, 17), (11.78, 13))
            ThreePointArc((11.78, 13), (12.137329727, 12.137329727), (13, 11.78))
            Line((13, 11.78), (17, 11.78))
            ThreePointArc((17, 11.78), (17.862670273, 12.137329727), (18.22, 13))
        make_face(mode=Mode.SUBTRACT)
    extrude(amount=BOSS_EXTRUDE1_DEPTH)


solid = part.part
